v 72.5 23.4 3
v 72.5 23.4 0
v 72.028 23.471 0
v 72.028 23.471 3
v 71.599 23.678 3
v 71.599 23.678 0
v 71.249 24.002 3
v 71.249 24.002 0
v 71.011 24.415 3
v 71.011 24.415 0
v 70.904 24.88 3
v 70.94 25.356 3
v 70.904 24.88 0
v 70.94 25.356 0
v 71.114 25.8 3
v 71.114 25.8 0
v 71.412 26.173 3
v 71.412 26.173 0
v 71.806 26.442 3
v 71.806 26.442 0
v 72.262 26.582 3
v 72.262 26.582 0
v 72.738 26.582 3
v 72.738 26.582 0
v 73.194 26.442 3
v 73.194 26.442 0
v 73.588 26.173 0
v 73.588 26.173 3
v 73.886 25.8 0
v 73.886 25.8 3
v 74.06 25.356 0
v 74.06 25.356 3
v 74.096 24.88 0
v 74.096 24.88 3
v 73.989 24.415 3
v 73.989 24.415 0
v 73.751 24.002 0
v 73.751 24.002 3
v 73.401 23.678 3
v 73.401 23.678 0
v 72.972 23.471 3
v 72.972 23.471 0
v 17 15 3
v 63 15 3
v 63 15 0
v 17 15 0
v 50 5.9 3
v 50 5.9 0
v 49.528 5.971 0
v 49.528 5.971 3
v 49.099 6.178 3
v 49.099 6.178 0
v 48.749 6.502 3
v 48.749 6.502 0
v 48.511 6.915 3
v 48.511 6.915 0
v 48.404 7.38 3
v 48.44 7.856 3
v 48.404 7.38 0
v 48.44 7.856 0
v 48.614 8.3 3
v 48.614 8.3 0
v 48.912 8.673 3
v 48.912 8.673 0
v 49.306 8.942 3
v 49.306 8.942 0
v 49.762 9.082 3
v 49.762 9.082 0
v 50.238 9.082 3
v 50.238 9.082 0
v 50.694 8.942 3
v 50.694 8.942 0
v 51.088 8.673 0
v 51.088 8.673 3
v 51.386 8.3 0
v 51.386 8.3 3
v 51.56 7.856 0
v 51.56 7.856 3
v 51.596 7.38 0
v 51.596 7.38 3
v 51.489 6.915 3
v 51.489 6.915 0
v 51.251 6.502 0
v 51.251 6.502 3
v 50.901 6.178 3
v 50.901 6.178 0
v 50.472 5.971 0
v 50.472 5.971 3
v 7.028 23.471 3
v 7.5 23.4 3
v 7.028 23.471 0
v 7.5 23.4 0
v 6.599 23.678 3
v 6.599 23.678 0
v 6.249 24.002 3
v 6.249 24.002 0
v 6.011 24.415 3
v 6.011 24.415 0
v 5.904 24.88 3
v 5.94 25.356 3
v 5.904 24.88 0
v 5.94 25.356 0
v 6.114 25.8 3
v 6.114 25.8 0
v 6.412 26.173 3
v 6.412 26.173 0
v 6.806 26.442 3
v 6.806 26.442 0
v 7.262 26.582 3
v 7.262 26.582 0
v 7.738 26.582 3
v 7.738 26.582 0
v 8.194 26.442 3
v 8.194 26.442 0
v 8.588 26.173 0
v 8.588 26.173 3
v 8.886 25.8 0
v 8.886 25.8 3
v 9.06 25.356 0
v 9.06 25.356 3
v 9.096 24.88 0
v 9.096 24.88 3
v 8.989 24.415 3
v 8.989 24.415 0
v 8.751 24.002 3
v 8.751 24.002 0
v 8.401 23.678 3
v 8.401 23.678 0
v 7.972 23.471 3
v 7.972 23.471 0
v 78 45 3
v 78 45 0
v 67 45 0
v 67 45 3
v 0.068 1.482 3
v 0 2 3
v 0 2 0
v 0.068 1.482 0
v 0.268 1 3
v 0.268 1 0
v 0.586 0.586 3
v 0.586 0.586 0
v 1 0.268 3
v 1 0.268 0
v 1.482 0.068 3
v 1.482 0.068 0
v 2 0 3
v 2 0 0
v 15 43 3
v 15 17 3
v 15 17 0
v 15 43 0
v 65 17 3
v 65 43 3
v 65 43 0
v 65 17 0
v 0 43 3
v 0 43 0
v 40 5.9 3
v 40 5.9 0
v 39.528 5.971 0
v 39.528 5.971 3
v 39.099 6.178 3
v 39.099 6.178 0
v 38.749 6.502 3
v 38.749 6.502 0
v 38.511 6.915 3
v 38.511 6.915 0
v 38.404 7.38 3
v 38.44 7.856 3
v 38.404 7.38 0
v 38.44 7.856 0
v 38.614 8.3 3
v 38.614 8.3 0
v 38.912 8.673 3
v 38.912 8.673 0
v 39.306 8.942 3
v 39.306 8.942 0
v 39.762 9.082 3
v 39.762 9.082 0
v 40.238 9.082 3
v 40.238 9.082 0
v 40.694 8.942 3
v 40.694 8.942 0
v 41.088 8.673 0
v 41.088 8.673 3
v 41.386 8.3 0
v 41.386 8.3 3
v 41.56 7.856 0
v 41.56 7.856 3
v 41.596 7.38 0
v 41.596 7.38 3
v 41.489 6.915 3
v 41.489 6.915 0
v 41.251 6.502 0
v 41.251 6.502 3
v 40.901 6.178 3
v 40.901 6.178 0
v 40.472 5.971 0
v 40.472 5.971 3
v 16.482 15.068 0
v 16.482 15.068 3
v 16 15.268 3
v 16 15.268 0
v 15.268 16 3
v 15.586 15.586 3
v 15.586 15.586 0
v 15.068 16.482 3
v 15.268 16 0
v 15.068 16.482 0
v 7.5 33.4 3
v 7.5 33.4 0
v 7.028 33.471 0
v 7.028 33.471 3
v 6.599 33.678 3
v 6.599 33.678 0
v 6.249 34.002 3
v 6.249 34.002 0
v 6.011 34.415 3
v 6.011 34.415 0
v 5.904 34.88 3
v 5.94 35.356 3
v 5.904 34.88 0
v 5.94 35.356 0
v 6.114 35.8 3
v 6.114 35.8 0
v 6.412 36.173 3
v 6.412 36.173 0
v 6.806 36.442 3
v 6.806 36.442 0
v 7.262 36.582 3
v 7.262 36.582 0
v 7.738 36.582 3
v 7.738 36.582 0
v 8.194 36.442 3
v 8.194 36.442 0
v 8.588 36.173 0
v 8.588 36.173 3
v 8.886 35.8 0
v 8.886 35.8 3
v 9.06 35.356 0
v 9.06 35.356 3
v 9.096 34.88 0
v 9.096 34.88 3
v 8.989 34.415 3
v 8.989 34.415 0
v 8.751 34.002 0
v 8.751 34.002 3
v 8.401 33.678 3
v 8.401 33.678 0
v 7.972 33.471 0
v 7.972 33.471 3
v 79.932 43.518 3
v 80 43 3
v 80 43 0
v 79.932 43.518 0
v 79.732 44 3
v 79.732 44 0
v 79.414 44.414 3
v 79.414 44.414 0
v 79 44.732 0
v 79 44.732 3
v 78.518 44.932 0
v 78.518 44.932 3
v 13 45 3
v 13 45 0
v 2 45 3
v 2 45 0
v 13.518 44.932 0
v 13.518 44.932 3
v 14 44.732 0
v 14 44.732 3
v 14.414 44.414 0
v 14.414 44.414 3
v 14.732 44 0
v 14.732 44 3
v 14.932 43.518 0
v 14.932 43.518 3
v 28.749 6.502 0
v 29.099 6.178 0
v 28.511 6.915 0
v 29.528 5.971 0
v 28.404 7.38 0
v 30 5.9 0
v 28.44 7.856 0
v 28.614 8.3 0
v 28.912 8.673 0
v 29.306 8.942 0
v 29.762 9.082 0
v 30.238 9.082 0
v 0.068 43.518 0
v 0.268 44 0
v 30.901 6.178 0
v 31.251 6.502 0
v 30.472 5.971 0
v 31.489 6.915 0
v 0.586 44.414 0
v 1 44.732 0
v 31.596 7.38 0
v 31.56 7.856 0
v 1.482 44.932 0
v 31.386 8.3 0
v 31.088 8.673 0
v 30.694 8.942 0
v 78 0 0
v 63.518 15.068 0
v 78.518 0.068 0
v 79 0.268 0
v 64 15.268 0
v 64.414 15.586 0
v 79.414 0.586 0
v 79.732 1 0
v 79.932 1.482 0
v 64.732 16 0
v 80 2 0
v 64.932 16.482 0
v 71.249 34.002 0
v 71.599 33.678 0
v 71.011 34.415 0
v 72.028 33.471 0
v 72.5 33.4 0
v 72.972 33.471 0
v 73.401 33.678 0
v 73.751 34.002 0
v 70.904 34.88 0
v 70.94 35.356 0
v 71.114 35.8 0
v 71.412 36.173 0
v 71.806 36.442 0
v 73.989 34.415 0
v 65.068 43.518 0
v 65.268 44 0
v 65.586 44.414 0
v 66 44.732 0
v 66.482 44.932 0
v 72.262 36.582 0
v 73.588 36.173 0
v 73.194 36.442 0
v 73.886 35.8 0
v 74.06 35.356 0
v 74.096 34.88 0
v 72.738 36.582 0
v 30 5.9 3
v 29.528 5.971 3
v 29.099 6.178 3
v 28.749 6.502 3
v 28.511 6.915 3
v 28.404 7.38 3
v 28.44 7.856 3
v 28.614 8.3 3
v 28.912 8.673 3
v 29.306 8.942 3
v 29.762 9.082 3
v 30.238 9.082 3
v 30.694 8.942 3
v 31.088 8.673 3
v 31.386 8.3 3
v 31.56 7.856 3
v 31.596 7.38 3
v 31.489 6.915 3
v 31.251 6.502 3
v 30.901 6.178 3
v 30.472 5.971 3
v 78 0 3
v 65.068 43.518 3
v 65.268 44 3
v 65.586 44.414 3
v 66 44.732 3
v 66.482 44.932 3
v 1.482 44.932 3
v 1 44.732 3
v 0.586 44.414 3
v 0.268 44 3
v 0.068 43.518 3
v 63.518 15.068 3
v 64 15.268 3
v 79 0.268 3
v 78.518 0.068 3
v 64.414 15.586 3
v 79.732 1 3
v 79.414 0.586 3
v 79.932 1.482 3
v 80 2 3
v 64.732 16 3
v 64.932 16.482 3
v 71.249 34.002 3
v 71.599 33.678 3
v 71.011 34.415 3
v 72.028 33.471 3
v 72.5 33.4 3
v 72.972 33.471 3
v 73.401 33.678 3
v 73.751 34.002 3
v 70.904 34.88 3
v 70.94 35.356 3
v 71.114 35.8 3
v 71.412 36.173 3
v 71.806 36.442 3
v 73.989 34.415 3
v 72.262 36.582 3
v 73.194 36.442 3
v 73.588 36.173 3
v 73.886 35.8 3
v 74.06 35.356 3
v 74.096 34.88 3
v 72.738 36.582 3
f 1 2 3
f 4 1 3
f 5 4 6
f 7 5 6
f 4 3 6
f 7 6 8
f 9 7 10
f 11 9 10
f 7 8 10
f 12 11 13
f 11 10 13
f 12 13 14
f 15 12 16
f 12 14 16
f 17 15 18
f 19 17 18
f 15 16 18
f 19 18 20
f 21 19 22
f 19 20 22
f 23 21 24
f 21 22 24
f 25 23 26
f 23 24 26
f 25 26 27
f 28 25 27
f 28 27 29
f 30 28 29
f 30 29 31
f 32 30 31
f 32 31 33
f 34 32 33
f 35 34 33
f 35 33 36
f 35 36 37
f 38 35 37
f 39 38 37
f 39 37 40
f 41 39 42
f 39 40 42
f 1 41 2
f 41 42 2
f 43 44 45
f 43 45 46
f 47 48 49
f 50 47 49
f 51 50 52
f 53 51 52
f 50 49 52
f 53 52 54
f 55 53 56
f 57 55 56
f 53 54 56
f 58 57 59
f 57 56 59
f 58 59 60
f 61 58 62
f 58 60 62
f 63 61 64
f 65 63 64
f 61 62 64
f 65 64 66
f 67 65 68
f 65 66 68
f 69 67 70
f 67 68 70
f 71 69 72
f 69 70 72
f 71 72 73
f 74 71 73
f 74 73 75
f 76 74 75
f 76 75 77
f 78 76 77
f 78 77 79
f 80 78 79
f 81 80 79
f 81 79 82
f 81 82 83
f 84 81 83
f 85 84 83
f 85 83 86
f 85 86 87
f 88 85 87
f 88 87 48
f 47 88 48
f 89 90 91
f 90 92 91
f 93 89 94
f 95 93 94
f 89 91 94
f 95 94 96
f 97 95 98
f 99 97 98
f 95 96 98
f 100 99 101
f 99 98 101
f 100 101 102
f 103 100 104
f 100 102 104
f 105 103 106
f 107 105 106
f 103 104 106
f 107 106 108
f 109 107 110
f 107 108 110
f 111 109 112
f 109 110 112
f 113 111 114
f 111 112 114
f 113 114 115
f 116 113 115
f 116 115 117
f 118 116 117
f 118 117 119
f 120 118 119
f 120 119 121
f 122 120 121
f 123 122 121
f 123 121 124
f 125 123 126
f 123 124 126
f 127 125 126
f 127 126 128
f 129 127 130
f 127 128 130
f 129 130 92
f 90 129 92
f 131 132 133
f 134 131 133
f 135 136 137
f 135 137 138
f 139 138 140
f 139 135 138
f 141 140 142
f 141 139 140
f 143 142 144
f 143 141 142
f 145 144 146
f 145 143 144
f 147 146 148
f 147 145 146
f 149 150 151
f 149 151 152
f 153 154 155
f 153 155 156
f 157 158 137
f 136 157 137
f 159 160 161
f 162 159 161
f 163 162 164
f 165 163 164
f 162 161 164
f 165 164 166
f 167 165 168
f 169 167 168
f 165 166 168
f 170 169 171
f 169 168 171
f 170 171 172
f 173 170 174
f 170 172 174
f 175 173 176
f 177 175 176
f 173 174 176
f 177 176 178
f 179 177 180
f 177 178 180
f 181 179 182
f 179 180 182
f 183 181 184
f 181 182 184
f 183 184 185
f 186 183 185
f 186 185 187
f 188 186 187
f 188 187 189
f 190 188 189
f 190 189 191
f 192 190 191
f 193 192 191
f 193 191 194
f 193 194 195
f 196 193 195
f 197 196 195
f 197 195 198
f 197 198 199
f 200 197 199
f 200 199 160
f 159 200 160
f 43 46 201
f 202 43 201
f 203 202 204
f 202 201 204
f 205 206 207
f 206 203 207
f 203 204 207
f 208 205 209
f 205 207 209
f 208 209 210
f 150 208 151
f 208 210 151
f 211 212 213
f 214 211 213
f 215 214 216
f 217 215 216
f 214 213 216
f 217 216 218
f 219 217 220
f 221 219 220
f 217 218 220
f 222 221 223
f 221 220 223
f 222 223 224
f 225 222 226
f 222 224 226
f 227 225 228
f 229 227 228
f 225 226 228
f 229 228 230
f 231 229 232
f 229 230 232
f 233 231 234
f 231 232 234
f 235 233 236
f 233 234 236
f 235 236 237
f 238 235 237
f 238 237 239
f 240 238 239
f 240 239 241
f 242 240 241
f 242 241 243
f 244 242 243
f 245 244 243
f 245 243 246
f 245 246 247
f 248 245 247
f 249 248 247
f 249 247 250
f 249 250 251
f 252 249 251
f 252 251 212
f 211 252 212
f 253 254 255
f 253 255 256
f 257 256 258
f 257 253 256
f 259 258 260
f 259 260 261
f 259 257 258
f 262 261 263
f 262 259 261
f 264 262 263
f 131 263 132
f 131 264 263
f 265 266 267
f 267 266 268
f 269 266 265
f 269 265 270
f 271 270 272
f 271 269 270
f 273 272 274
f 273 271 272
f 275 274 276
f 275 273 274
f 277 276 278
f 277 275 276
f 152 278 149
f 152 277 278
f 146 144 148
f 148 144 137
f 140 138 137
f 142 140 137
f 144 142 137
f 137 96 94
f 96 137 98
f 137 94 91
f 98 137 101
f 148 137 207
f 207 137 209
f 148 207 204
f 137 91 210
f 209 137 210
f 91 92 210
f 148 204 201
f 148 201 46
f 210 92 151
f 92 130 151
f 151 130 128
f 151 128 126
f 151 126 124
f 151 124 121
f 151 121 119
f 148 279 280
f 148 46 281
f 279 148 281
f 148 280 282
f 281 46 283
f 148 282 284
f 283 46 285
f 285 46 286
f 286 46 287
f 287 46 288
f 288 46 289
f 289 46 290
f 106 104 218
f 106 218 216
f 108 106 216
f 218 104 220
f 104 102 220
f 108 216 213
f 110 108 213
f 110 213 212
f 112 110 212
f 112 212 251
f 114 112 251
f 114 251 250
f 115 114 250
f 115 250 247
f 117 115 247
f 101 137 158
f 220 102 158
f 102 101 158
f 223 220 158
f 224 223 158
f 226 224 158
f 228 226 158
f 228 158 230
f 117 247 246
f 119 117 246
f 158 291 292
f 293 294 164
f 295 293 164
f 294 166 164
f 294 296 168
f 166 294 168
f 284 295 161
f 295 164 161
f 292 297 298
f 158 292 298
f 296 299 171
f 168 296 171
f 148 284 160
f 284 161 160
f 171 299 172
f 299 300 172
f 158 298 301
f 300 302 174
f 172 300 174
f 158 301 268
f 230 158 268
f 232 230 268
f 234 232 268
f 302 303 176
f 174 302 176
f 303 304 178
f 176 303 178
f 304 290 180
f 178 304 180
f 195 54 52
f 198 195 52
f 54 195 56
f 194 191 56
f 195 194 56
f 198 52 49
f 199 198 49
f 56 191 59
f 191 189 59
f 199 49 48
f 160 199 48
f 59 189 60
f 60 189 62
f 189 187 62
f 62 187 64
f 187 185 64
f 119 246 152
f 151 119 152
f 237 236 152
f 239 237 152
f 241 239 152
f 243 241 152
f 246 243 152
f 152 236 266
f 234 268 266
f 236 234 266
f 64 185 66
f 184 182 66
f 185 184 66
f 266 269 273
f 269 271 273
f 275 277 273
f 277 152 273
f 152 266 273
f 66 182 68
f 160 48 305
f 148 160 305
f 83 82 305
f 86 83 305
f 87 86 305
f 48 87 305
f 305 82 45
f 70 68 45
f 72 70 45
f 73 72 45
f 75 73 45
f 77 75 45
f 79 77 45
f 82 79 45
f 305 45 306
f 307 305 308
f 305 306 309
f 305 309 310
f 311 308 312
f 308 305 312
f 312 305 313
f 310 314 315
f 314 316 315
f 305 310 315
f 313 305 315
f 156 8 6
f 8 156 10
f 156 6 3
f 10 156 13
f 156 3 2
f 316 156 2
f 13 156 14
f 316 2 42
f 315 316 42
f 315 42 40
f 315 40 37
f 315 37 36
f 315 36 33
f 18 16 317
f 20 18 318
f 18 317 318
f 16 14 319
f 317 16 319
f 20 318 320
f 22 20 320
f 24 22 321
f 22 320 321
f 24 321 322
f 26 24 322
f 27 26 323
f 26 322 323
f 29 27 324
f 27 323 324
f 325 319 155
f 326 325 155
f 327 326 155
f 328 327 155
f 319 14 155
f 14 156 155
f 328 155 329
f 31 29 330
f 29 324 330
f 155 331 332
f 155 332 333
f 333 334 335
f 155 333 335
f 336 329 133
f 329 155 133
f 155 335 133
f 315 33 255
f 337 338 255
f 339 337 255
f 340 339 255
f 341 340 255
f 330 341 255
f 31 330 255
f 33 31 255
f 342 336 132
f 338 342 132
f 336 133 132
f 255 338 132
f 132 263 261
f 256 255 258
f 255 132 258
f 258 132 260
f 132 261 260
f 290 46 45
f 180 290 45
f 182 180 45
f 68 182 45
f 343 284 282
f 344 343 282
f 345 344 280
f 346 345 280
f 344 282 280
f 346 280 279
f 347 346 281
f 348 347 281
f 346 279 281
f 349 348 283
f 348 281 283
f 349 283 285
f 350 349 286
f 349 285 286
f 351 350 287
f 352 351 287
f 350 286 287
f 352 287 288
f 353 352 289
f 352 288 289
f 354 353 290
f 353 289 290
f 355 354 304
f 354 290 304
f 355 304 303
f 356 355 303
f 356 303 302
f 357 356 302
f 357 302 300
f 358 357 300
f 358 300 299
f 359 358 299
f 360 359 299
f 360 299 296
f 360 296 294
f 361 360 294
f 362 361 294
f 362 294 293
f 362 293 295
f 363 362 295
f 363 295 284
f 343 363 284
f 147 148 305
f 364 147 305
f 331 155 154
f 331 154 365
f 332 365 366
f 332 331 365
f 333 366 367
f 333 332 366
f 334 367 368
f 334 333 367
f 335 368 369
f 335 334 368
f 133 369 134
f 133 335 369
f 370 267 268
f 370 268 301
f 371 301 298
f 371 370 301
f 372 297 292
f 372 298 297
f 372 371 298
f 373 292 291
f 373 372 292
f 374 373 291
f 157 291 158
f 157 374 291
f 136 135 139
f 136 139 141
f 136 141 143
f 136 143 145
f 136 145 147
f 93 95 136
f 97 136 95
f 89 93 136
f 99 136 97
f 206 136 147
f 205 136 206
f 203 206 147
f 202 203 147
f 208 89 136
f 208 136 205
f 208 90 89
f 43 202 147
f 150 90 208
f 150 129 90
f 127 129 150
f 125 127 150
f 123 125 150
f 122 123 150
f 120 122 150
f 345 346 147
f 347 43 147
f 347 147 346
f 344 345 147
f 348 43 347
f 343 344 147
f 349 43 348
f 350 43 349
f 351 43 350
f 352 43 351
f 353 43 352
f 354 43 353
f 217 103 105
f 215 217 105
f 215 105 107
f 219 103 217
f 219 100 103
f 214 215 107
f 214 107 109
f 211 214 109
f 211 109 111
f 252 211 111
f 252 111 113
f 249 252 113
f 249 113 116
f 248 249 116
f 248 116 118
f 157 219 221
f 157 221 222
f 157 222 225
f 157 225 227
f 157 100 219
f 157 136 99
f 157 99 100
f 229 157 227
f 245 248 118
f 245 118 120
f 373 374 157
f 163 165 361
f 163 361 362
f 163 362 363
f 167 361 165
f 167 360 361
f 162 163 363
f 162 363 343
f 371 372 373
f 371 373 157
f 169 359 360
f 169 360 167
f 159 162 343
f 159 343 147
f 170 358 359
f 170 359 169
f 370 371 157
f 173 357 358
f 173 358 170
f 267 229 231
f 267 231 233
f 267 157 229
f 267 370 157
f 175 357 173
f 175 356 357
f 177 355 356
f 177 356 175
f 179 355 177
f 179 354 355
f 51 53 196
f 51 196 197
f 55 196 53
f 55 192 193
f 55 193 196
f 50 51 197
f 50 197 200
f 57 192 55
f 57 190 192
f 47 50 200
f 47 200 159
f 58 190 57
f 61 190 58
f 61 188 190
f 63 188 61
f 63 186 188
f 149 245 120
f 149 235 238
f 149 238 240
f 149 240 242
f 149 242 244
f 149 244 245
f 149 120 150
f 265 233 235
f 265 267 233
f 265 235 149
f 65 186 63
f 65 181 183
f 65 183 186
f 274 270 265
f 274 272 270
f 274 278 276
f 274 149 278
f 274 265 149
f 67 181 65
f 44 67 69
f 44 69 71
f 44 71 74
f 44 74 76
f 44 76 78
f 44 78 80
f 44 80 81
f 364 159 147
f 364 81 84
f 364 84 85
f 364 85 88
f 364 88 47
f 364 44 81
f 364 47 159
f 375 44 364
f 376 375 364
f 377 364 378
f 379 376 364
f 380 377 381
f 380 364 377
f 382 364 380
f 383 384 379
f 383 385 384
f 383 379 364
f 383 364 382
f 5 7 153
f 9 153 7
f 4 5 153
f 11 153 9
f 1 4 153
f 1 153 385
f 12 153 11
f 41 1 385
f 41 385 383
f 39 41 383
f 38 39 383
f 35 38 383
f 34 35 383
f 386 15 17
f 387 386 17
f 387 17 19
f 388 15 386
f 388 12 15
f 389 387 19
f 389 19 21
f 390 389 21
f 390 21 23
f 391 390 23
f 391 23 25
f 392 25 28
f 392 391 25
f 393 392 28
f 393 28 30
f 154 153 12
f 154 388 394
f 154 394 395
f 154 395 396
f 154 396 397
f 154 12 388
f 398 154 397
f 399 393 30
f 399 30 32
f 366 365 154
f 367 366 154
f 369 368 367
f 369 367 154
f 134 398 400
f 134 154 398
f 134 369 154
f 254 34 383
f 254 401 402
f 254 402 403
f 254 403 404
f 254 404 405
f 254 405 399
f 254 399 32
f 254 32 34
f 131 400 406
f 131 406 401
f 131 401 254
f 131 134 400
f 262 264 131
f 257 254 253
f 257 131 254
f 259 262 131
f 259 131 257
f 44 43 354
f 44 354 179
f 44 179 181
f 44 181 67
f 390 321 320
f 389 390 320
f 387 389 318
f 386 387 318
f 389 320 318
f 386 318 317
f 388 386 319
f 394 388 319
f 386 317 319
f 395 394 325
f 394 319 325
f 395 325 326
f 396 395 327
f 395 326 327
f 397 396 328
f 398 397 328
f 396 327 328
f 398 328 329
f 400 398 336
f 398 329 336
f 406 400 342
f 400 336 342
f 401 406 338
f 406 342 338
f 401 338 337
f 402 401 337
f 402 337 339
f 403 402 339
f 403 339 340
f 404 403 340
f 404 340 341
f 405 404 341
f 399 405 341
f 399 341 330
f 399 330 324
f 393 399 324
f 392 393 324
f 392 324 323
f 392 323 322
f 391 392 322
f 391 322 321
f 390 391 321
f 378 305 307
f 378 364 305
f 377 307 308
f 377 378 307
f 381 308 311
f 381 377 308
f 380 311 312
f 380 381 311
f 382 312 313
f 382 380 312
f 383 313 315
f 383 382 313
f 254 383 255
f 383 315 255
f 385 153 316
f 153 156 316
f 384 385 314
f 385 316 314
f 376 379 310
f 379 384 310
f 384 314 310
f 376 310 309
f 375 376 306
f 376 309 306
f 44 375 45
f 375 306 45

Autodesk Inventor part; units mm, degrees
ref_plane "YZ Plane" through (0, 0, 0) normal (1, 0, 0) x (0, 1, 0)
ref_plane "XZ Plane" through (0, 0, 0) normal (0, 1, 0) x (-1, 0, 0)
ref_plane "XY Plane" through (0, 0, 0) normal (0, 0, 1) x (1, 0, 0)
sketch "スケッチ1" plane through (0, 0, 0) normal (0, 0, 1) x (1, 0, 0)
  line L0 (0, 0) -> (80, 0)
  line L1 (80, 0) -> (80, 45)
  line L2 (80, 45) -> (0, 45)
  line L3 (0, 45) -> (0, 0)
  dimension "d0" = 80
  dimension "d1" = 45
extrude "押し出し1" add sketch "スケッチ1" along normal blind 3
sketch "スケッチ2" plane through (0, 0, 3) normal (0, 0, 1) x (1, 0, 0)
  line L0 (0, 45) -> (0, 0) projected
  line L1 (0, 0) -> (80, 0) projected
  line L2 (80, 45) -> (0, 45) projected
  line L3 (40, 45) -> (40, 0) construction
  point P0 (7.5, 35)
  point P1 (7.5, 25)
  point P2 (30, 7.5)
  point P3 (72.5, 35)
  point P4 (72.5, 25)
  point P5 (50, 7.5)
  point P6 (40, 7.5)
  dimension "d4" = 7.5
  dimension "d5" = 35
  dimension "d6" = 10
  dimension "d7" = 7.5
  dimension "d8" = 7.5
  dimension "d9" = 30
hole "穴1" at (7.5, 35, 3) at (7.5, 25, 3) at (30, 7.5, 3) at (72.5, 35, 3) at (72.5, 25, 3) at (50, 7.5, 3) at (40, 7.5, 3) direction (0, 0, -1) diameter 3.2 end through all
sketch "スケッチ3" plane through (0, 0, 3) normal (0, 0, 1) x (1, 0, 0)
  line L0 (80, 45) -> (0, 45) projected
  line L1 (15, 45) -> (65, 45)
  line L2 (65, 45) -> (65, 15)
  line L3 (65, 15) -> (15, 15)
  line L4 (15, 15) -> (15, 45)
  line L5 (0, 45) -> (0, 0) projected
  line L6 (0, 0) -> (80, 0) projected
  dimension "d17" = 50
  dimension "d18" = 30
  dimension "d19" = 15
  dimension "d20" = 15
extrude "押し出し2" cut sketch "スケッチ3" against normal blind 3
fillet "フィレット1" radius 2 8 edges at (15, 45, 1.5) (65, 15, 1.5) (65, 45, 1.5) (80, 45, 1.5) (0, 45, 1.5) (0, 0, 1.5) (80, 0, 1.5) (15, 15, 1.5)
properties part number "射出_固定1" material "アルミニウム 6061"
